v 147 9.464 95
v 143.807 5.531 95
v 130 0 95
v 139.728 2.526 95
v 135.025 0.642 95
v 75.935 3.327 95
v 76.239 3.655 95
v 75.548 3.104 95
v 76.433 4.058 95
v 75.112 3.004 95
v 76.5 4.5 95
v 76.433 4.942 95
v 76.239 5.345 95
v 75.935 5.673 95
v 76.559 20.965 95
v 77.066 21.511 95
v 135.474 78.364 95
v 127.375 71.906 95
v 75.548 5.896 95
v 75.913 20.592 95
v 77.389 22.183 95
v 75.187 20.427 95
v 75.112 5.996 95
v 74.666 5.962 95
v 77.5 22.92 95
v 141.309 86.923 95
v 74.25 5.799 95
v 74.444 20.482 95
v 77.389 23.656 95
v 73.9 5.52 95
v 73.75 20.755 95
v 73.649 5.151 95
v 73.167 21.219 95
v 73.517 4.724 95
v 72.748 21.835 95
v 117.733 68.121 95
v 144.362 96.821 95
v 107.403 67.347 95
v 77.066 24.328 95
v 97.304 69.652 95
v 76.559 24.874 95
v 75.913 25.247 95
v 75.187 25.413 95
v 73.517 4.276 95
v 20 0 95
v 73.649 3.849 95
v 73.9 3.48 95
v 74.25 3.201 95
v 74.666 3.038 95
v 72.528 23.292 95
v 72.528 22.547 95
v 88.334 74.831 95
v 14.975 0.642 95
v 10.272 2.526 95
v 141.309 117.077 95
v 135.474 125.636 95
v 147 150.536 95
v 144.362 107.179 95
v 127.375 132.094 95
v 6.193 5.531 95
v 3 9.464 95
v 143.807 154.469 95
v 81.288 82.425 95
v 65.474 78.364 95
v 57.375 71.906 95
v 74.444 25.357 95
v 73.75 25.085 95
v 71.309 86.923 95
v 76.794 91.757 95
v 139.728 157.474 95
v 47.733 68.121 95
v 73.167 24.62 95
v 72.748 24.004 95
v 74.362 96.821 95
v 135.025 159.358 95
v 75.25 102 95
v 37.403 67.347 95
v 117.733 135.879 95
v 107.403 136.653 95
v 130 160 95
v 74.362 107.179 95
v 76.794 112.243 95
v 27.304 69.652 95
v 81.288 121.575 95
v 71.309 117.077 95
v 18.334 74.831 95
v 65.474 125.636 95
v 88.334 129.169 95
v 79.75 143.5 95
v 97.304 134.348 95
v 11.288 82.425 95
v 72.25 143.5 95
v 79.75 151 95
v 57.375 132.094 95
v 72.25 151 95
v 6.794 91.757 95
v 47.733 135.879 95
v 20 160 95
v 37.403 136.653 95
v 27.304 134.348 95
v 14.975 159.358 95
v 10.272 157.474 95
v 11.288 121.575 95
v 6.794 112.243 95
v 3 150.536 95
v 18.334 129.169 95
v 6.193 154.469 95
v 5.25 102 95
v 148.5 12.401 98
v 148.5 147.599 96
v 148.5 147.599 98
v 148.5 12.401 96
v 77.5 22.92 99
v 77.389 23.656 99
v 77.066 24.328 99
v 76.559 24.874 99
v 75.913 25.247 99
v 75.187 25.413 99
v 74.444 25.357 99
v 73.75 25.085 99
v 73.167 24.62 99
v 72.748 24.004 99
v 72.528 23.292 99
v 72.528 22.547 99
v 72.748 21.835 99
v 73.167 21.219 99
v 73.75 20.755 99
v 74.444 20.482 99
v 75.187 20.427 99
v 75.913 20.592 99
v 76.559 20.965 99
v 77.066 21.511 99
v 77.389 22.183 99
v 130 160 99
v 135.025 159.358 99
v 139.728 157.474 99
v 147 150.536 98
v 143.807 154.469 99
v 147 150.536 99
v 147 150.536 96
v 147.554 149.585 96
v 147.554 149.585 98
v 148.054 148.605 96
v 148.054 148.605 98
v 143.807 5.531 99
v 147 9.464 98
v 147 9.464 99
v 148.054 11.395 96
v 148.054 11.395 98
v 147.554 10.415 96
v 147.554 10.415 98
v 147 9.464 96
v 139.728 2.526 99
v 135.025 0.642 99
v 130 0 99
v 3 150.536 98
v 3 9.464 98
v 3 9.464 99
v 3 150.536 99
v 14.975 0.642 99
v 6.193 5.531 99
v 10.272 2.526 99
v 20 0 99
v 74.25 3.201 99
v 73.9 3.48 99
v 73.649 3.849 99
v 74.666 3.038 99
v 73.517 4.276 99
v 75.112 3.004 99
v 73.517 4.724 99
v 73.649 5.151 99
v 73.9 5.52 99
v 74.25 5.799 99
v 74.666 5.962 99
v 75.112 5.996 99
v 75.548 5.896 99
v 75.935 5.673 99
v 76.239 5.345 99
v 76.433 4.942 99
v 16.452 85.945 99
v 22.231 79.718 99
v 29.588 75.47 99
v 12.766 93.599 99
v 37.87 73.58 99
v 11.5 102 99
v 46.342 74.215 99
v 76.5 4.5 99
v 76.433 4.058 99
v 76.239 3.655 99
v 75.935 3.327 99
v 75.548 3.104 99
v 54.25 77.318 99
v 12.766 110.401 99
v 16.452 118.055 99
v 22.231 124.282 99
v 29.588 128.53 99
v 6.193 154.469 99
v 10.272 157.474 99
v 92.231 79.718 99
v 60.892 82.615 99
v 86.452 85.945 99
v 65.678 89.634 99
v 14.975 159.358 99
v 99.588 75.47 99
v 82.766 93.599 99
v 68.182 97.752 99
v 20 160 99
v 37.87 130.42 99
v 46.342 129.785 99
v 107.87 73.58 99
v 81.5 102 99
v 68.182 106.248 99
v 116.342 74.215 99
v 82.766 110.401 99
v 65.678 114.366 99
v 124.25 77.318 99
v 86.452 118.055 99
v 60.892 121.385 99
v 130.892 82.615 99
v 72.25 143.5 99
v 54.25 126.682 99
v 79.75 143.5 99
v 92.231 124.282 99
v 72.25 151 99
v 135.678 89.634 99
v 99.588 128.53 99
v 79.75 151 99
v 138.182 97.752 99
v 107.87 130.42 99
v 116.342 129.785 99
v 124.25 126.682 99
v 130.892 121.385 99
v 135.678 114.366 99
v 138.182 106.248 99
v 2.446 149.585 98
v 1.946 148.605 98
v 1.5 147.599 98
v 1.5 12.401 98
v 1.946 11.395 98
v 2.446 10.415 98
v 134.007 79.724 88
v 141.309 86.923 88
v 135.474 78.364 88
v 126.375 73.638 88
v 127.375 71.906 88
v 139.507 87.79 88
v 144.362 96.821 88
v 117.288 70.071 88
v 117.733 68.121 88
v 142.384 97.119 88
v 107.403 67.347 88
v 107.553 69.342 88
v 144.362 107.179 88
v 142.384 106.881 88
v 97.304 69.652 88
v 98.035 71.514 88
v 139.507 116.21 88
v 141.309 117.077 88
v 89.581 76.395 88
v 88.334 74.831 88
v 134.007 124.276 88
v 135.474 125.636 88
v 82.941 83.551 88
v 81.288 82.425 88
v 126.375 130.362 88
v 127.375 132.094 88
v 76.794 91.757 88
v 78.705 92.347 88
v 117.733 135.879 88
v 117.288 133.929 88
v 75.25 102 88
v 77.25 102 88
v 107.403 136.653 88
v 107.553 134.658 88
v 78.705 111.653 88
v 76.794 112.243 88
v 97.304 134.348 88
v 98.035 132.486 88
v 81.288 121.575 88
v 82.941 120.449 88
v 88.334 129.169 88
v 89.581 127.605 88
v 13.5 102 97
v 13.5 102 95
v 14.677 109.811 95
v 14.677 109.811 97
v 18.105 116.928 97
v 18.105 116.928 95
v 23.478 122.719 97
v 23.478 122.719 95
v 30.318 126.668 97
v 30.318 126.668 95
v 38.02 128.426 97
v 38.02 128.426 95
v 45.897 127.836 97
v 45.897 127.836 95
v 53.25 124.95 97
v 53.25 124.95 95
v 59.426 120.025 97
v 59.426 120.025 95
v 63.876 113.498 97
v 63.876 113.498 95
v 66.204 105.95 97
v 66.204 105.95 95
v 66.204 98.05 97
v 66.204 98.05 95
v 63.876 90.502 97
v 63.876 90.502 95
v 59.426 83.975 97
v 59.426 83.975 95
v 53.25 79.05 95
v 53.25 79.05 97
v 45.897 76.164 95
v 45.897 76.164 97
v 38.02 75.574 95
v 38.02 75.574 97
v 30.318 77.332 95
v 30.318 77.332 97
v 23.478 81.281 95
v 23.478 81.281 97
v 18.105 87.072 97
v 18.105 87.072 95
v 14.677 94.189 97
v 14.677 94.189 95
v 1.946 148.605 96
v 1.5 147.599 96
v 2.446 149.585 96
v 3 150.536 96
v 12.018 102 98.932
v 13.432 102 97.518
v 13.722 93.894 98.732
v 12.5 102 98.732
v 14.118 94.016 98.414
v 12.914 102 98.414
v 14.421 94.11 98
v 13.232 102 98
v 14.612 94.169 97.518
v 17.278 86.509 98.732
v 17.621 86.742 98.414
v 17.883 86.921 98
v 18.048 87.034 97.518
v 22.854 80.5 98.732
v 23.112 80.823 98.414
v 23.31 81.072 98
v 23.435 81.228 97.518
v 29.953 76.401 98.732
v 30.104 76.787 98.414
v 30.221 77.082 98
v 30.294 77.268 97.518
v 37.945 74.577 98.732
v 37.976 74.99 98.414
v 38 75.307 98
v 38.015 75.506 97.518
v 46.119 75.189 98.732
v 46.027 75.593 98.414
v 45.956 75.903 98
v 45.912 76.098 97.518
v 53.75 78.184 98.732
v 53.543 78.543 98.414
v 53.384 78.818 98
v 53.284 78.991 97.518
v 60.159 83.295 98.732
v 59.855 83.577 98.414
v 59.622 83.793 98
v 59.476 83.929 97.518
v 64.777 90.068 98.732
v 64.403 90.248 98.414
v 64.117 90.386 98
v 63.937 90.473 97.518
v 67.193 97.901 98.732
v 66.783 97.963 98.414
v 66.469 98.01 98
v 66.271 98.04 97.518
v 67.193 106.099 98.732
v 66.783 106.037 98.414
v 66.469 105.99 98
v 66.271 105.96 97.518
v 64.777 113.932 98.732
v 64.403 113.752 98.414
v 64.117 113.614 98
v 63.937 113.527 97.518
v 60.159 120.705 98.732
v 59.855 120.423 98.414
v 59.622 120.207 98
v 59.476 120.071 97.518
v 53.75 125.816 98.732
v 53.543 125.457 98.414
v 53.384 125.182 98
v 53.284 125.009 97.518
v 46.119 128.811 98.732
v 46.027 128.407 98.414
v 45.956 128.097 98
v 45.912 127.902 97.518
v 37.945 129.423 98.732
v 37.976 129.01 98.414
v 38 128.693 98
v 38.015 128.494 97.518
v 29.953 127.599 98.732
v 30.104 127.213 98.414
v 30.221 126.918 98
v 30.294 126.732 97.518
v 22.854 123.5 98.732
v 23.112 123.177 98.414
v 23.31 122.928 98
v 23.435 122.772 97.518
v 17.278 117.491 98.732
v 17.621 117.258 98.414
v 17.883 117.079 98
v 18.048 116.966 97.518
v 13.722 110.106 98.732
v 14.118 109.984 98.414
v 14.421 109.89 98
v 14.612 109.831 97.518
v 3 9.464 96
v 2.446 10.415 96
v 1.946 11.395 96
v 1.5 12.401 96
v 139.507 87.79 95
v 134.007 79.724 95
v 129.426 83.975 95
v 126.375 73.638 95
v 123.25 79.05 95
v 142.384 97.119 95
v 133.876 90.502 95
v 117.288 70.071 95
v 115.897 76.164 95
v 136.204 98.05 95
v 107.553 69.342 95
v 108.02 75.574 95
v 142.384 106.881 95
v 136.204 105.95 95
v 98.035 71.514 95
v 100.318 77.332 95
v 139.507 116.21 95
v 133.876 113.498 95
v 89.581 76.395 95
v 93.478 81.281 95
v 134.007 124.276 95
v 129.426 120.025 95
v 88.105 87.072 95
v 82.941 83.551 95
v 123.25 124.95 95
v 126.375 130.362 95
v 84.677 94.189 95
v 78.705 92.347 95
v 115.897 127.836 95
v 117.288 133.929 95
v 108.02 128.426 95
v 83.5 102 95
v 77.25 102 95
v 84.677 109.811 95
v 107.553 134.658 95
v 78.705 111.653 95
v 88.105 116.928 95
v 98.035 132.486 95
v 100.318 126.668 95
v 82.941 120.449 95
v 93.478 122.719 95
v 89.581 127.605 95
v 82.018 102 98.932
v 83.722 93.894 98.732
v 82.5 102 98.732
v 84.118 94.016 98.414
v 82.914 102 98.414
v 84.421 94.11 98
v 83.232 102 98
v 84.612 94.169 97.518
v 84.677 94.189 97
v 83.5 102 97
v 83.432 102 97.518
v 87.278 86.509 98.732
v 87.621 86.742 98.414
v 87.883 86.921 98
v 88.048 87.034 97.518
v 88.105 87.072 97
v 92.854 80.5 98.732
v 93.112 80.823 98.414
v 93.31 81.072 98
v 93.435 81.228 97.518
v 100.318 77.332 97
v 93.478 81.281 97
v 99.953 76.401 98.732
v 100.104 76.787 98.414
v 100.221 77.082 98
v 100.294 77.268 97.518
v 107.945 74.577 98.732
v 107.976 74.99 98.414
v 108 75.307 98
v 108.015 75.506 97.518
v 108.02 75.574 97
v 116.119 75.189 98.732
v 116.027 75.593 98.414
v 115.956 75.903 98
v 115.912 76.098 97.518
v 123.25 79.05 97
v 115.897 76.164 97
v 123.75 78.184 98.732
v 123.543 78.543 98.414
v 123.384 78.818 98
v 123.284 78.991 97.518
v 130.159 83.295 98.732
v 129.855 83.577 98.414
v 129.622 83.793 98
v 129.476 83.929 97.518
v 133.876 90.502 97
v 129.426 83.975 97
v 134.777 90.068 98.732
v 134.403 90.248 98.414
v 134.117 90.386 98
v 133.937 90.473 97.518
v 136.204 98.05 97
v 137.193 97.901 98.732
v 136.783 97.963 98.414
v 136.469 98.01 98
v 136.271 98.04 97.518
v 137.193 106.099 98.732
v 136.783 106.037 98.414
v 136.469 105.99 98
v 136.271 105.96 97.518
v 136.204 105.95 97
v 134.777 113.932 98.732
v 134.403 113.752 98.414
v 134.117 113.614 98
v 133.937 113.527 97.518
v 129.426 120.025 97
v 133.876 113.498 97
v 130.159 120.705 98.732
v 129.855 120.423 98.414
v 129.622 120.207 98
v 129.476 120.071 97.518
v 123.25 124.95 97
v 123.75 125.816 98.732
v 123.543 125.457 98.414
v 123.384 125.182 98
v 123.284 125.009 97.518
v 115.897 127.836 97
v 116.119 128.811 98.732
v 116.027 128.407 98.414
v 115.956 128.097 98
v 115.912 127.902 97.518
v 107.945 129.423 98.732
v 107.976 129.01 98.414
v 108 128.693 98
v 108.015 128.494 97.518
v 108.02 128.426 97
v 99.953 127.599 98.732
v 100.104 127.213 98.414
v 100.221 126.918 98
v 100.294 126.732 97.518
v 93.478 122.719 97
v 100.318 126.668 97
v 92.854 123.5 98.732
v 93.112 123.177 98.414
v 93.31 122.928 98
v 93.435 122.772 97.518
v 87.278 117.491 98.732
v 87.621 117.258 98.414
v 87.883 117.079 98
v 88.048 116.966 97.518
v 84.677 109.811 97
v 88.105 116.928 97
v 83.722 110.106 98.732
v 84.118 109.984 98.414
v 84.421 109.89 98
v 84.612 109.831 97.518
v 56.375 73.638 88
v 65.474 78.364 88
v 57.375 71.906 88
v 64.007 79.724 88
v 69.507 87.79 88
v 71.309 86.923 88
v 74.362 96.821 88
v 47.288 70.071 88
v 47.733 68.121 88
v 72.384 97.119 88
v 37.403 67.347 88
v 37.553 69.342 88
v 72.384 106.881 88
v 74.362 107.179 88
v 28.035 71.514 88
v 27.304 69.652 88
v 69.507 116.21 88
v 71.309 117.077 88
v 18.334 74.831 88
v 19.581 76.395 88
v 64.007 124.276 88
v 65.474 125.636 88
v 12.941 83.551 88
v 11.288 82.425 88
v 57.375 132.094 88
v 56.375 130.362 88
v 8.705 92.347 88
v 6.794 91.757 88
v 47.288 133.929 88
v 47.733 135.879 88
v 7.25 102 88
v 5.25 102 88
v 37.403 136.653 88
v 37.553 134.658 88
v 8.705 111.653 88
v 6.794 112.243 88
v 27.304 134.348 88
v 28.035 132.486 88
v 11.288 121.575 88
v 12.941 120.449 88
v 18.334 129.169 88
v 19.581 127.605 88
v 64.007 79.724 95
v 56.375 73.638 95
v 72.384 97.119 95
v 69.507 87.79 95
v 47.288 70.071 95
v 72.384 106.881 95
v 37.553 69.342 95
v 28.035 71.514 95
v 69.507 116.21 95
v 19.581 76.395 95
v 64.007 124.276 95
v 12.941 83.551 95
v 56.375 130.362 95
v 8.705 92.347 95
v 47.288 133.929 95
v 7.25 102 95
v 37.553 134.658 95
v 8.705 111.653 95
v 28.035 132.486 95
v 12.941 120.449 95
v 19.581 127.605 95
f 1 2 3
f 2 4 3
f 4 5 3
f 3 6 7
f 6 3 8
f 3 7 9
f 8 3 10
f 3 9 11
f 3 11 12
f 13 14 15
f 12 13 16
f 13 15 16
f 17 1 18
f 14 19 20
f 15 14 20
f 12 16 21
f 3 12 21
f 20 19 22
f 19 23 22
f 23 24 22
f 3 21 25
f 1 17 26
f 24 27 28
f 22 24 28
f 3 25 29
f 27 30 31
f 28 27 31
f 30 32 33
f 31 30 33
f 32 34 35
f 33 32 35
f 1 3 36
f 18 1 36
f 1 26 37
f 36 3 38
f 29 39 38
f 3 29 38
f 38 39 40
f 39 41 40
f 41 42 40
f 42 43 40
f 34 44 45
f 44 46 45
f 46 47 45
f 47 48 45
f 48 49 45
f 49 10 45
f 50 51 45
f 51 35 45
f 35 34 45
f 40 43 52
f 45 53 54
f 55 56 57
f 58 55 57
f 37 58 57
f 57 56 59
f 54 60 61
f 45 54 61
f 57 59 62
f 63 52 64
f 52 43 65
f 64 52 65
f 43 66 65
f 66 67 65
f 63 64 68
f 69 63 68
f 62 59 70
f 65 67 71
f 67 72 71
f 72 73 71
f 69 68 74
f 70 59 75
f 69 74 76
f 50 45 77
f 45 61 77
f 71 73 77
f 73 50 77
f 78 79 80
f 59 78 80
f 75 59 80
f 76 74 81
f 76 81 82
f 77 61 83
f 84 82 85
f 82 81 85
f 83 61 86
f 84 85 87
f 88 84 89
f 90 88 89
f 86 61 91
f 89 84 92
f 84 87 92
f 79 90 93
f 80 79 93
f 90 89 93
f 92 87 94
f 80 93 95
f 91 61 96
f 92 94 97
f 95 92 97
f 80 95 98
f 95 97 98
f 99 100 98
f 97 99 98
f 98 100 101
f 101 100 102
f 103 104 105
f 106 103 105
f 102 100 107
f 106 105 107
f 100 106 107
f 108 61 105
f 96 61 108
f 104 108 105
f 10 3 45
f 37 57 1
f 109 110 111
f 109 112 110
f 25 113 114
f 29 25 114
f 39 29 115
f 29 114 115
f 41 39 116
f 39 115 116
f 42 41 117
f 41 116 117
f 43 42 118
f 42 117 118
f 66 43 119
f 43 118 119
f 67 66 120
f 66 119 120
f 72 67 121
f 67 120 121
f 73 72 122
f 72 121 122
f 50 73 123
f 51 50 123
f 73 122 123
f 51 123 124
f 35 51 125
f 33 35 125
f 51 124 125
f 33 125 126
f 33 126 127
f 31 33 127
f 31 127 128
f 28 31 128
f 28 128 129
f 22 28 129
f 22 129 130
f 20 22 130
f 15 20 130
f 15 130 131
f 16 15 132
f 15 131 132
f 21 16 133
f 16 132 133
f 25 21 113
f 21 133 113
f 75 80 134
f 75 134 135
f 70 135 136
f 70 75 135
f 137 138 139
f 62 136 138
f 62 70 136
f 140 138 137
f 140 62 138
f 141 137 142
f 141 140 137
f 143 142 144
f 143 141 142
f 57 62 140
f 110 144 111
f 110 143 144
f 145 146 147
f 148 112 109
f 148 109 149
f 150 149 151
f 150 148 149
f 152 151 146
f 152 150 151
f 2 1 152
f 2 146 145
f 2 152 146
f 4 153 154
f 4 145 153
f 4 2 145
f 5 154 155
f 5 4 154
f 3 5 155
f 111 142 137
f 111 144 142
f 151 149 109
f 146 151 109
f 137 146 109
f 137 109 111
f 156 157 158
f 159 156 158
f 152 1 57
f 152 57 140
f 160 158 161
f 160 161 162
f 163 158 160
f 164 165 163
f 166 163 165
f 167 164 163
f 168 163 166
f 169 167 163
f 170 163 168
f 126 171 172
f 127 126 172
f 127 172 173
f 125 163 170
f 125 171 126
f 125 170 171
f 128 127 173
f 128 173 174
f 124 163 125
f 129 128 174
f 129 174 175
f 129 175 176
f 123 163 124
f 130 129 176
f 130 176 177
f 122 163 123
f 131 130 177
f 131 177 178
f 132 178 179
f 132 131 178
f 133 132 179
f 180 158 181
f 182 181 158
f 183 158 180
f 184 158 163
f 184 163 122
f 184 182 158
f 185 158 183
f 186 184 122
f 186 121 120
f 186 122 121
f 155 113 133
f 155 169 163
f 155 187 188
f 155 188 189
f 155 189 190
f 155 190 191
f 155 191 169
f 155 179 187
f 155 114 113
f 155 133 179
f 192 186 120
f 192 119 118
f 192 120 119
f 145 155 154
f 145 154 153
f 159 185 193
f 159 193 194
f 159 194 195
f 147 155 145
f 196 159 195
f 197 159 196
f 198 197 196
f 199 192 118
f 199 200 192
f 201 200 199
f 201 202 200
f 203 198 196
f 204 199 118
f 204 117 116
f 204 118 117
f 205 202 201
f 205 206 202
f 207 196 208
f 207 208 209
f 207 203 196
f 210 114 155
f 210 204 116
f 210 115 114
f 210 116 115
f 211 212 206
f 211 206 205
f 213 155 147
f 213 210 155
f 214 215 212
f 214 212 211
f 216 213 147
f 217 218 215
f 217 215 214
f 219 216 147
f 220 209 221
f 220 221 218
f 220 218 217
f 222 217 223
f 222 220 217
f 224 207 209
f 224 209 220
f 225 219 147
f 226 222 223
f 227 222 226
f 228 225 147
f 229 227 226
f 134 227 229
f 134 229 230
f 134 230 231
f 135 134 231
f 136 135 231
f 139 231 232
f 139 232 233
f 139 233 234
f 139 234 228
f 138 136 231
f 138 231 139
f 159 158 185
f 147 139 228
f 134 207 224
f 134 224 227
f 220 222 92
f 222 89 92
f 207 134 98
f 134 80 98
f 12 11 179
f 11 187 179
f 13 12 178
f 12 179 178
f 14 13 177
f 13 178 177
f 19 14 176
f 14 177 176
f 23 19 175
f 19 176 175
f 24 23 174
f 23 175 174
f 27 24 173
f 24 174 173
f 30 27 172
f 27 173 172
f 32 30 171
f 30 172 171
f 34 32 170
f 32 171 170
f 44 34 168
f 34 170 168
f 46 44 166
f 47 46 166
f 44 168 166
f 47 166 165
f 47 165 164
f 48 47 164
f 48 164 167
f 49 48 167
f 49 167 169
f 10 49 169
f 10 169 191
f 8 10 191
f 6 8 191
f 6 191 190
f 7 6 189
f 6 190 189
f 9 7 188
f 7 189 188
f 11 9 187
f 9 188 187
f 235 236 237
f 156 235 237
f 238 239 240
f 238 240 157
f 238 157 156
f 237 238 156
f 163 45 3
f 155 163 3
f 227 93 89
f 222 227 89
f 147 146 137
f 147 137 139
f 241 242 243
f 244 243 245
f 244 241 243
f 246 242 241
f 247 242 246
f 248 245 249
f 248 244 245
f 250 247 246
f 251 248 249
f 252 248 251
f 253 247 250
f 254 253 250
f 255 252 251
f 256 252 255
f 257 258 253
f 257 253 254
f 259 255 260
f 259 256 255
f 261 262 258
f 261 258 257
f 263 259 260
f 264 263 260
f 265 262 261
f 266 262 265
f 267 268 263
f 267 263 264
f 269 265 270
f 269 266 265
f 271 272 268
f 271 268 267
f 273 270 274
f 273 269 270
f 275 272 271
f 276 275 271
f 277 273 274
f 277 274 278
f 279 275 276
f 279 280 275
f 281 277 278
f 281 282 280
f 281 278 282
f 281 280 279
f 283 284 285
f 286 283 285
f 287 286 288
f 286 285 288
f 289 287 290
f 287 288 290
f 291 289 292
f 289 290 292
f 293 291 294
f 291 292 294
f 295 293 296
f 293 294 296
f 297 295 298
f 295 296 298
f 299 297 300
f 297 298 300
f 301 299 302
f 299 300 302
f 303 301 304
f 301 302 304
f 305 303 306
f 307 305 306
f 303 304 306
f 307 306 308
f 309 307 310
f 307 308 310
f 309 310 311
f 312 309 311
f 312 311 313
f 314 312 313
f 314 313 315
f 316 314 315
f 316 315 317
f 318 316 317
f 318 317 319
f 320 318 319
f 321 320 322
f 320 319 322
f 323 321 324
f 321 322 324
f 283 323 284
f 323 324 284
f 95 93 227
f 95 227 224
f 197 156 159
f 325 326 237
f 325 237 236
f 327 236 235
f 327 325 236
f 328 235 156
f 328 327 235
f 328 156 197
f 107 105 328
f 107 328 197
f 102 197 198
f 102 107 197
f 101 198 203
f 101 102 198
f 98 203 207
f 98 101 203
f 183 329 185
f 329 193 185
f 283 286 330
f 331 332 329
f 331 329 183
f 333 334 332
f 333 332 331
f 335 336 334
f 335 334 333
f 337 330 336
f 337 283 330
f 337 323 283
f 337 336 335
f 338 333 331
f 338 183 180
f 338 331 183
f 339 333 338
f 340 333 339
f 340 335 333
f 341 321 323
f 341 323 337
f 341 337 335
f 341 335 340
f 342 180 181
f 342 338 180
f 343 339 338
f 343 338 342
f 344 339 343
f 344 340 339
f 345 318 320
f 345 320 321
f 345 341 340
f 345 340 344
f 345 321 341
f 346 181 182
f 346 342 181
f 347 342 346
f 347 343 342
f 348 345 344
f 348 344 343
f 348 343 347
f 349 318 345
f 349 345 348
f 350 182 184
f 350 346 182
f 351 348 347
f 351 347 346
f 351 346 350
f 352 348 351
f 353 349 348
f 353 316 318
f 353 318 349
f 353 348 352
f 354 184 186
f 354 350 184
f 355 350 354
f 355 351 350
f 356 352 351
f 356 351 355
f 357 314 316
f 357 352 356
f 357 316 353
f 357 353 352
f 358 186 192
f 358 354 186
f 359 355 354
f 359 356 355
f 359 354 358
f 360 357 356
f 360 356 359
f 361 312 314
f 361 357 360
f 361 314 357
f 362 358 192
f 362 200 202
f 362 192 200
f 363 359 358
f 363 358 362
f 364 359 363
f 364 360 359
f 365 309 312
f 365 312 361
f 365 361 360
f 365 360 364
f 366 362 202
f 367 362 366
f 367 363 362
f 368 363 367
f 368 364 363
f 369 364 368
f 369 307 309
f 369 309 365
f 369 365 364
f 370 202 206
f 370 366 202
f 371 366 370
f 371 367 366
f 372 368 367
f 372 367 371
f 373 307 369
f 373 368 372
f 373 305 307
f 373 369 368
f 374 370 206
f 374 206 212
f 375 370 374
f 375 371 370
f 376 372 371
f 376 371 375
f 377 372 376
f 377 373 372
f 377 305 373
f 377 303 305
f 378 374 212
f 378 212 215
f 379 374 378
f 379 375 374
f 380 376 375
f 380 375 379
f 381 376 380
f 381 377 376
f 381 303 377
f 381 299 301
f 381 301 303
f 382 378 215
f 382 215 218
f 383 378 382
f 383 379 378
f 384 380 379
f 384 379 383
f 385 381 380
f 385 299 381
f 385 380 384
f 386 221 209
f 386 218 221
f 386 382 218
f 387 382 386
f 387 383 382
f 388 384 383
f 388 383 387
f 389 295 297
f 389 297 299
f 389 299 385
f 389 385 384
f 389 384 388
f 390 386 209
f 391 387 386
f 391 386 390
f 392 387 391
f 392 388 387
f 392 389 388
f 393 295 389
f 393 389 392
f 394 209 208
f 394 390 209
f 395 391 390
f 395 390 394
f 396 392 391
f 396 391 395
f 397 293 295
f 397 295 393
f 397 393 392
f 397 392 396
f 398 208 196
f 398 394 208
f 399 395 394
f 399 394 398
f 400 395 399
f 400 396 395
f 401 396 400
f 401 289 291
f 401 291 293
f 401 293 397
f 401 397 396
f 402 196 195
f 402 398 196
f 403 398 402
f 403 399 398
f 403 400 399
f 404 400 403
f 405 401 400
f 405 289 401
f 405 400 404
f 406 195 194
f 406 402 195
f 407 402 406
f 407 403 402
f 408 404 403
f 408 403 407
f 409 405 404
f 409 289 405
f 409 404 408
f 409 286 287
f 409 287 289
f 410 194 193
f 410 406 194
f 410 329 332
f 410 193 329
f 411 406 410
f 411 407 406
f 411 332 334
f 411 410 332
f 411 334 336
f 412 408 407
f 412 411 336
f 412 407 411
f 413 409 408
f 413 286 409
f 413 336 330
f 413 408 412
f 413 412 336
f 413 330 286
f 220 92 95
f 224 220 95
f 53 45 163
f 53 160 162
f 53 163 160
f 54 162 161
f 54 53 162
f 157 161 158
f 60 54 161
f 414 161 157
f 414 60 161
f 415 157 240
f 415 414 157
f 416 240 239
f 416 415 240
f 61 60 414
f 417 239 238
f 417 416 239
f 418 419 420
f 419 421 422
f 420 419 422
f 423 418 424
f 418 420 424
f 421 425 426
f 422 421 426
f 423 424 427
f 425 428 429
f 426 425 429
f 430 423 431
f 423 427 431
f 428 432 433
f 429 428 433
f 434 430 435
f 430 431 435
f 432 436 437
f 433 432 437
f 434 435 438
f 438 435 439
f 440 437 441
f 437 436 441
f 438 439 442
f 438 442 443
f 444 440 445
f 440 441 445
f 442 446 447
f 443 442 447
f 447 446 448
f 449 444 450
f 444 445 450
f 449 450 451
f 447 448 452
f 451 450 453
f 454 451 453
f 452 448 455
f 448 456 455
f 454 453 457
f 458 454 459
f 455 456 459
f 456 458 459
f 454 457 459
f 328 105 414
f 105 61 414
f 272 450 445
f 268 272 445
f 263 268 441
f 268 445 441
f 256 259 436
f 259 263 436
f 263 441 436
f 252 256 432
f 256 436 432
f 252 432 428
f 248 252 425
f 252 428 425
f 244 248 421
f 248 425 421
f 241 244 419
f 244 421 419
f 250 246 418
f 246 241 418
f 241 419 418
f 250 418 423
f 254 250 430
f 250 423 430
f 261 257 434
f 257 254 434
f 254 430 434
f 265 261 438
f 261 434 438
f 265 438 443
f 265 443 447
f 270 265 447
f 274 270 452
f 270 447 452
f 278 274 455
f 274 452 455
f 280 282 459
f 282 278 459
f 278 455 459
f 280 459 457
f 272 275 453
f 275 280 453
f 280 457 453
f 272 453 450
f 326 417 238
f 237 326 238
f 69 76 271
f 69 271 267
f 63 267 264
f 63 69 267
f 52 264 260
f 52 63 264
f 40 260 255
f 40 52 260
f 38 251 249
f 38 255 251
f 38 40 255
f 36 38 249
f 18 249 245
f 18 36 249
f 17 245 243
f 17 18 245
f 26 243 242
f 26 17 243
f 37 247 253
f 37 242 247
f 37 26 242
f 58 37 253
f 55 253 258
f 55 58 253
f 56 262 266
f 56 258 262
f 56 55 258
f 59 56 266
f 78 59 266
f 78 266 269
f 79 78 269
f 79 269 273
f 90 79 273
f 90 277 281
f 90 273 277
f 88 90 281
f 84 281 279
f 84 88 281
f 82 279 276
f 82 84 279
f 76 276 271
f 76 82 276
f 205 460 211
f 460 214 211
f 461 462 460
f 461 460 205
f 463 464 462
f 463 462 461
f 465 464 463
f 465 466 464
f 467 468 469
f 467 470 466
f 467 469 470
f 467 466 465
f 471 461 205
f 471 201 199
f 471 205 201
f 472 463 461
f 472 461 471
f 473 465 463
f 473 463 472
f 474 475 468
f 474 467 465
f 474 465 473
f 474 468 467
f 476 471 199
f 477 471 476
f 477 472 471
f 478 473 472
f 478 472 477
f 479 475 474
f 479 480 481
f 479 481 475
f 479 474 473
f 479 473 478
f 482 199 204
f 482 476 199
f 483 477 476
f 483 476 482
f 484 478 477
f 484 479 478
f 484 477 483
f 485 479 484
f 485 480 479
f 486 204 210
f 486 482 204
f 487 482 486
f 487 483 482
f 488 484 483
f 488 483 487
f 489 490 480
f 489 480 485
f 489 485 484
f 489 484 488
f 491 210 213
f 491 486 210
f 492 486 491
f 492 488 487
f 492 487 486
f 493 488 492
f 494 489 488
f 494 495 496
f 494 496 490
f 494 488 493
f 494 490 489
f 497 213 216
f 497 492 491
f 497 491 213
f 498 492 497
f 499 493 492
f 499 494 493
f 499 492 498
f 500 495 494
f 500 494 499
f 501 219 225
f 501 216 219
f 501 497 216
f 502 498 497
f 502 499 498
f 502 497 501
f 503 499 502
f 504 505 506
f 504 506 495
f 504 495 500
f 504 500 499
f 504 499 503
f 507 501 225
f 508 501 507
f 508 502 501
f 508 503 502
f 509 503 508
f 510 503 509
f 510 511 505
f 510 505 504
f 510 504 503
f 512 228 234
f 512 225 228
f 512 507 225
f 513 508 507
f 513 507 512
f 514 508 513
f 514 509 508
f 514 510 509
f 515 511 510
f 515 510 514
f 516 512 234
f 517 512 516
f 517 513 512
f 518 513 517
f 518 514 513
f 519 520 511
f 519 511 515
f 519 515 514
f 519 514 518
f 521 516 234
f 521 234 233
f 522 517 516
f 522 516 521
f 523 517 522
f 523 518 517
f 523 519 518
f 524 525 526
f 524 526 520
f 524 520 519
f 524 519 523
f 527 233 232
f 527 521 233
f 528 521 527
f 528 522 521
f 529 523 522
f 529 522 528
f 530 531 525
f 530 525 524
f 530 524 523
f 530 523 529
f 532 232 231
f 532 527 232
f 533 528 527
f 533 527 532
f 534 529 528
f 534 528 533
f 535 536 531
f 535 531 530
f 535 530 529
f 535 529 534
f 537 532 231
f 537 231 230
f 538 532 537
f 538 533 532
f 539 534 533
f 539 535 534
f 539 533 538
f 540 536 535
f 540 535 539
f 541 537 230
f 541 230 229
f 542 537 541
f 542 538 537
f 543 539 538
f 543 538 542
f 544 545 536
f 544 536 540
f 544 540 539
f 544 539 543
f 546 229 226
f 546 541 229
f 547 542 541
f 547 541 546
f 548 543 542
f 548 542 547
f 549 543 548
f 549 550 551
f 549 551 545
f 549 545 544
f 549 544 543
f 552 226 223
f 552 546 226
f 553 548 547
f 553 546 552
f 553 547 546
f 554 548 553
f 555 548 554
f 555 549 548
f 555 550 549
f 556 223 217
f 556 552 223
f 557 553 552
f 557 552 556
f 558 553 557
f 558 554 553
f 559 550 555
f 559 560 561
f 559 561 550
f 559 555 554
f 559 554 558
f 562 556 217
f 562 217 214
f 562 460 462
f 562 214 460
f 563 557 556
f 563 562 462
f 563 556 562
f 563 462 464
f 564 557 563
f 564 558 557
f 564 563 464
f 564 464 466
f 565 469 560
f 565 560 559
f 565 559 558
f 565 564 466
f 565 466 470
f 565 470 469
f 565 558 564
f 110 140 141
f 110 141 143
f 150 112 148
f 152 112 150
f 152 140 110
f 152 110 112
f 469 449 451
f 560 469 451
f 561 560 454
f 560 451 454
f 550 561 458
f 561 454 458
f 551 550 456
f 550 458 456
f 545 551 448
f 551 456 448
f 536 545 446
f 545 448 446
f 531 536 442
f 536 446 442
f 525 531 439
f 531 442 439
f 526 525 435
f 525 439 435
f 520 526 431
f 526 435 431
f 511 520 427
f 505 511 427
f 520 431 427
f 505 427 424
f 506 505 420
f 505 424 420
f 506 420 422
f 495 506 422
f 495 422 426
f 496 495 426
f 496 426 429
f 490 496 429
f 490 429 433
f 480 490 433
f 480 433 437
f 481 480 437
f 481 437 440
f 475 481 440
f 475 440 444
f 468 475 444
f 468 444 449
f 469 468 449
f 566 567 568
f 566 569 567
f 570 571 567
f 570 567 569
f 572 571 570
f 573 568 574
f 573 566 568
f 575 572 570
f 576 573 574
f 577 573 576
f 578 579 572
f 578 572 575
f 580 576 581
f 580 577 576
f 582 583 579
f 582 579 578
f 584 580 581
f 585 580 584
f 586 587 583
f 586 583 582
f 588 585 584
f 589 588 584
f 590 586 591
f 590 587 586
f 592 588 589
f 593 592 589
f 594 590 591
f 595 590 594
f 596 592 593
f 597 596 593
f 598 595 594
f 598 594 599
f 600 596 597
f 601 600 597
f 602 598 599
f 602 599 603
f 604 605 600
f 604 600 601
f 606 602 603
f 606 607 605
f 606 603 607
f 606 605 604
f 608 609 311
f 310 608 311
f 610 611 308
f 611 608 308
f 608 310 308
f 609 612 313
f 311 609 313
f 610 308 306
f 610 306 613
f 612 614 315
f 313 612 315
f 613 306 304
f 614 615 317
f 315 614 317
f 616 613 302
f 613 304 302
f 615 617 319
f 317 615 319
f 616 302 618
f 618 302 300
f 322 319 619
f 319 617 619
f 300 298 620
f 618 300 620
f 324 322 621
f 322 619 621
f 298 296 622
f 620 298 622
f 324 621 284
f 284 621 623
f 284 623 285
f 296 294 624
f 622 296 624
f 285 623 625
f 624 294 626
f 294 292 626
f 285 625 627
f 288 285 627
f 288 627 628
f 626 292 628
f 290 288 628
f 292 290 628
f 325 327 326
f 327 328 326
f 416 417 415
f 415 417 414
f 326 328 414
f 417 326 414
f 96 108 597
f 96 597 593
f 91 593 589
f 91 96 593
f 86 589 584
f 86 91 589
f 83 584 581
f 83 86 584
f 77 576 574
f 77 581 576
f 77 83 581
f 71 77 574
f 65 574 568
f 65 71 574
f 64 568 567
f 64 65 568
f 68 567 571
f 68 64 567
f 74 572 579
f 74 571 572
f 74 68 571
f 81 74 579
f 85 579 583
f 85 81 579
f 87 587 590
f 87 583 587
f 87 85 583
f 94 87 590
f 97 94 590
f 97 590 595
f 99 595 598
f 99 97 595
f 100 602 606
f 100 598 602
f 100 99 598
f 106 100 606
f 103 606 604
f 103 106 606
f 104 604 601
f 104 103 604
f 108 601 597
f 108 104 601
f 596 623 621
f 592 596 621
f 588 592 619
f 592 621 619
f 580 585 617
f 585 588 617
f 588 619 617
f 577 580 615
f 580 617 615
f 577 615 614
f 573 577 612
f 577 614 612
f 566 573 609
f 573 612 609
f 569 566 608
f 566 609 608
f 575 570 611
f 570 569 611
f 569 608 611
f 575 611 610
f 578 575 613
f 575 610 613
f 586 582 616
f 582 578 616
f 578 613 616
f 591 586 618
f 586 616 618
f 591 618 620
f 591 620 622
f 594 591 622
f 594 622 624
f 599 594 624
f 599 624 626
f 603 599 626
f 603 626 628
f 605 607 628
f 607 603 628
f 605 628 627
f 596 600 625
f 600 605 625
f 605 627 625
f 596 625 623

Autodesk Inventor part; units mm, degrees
sketch "Sketch1" plane through (0, 0, 0) normal (0, 0, 1) x (1, 0, 0)
  line L0 (20, 0) -> (130, 0)
  line L1 (150, 20) -> (150, 140)
  line L2 (130, 160) -> (20, 160)
  line L3 (0, 140) -> (0, 20)
  arc A0 (20, 160) -> (0, 140) centre (20, 140) ccw
  arc A1 (150, 140) -> (130, 160) centre (130, 140) ccw
  arc A2 (130, 0) -> (150, 20) centre (130, 20) ccw
  arc A3 (0, 20) -> (20, 0) centre (20, 20) ccw
  point P0 (0, 0)
  point P1 (150, 160)
  point P2 (150, 0)
  point P3 (0, 160)
  dimension "d443" = 160
  dimension "d444" = 150
extrude "Extrusion1" add sketch "Sketch1" along normal blind 95
sketch "Sketch5" plane through (0, 0, 95) normal (0, 0, 1) x (1, 0, 0)
  line L0 (130, 157) -> (20, 157)
  arc A0 (20, 157) -> (3, 140) centre (20, 140) ccw
  line L1 (3, 140) -> (3, 20)
  arc A1 (3, 20) -> (20, 3) centre (20, 20) ccw
  line L2 (20, 3) -> (130, 3)
  arc A2 (130, 3) -> (147, 20) centre (130, 20) ccw
  line L3 (147, 20) -> (147, 140)
  arc A3 (147, 140) -> (130, 157) centre (130, 140) ccw
  point P0 (0, 0)
  point P1 (0, 165)
  point P2 (150, 165)
  point P3 (0, 160)
  point P4 (150, 160)
  point P5 (150, 0)
  dimension "d456" = 160
  dimension "d457" = 150
  dimension "d458" = 160
  dimension "d459" = 150
extrude "Extrusion2" cut sketch "Sketch5" against normal blind 92
sketch "Sketch7" plane through (0, 20, 0) normal (-1, 0, 0) x (0, 0, 1)
  circle A0 centre (47.5, 110) radius 7.8
  point P0 (95, 120)
  dimension "d455" = 15.6
extrude "Extrusion4" cut sketch "Sketch7" against normal blind 98
sketch "Boceto12" plane through (20, 0, 0) normal (0, -1, 0) x (1, 0, 0)
  circle A0 centre (81.375, 48) radius 12
  circle A1 centre (28.625, 48) radius 12
extrude "Extrusión6" cut sketch "Boceto12" against normal blind 5
sketch "Boceto36" plane through (20, 160, 0) normal (0, 1, 0) x (1, 0, 0)
  circle A0 centre (55, -47.7801) radius 15
  dimension "d388" = 30
extrude "Extrusión17" cut sketch "Boceto36" against normal blind 6
ref_plane "Plano de trabajo1" through (0, 0, -50) normal (0, 0, -1) x (-1, 0, 0)
ref_plane "Plano de trabajo4" through (203.75, 20, 0) normal (-1, 0, 0) x (0, 0, 1)
ref_plane "Plano de trabajo5" through (200, 20, 0) normal (1, 0, 0) x (0, 0, -1)
ref_plane "Plano de trabajo6" through (20, 210, 0) normal (0, 1, 0) x (1, 0, 0)
sketch "Boceto57" plane through (150, 20, 0) normal (1, 0, 0) x (0, 0, -1)
  circle A0 centre (-47.5, 110) radius 7.8
  dimension "d453" = 15.6
extrude "Extrusión26" cut sketch "Boceto57" against normal blind 10
sketch "Boceto61" plane through (0, 0, 0) normal (0, 0, -1) x (-1, 0, 0)
  circle A0 centre (-75, 128.3417) radius 7.5
  circle A1 centre (-74.9977, 103.4764) radius 7.5
  circle A2 centre (-74.9673, 78.5161) radius 7.5
  dimension "d399" = 15
extrude "Extrusión28" add sketch "Boceto61" along normal blind 4
sketch "Boceto64" plane through (20, 160, 0) normal (0, 1, 0) x (1, 0, 0)
  circle A0 centre (12, -12) radius 1.5
  circle A1 centre (98, -12) radius 1.5
  circle A2 centre (12, -83) radius 1.5
  circle A3 centre (98, -83) radius 1.5
  dimension "d417" = 3
  dimension "d418" = 3
  dimension "d468" = 3
  dimension "d469" = 3
extrude "Extrusión30" cut sketch "Boceto64" against normal blind 20
sketch "Boceto65" plane through (20, 0, 0) normal (0, -1, 0) x (1, 0, 0)
  circle A0 centre (14.995, 99.7655) radius 2.5
  circle A1 centre (94.995, 99.7655) radius 2.5
  circle A2 centre (14.995, 19.7655) radius 2.5
  circle A3 centre (94.995, 19.7655) radius 2.5
extrude "Extrusión31" cut sketch "Boceto65" against normal blind 10
sketch "Boceto66" plane through (20, 0, 0) normal (0, -1, 0) x (1, 0, 0)
  circle A0 centre (28.625, 48) radius 12 projected
  circle A1 centre (28.625, 48) radius 21
  circle A2 centre (81.375, 48) radius 12 projected
  circle A3 centre (81.375, 48) radius 21
  point P0 (-20, 0)
  dimension "d474" = 42
  dimension "d475" = 42
extrude "Extrusión32" cut sketch "Boceto66" against normal blind 10
sketch "Boceto67" plane through (20, 3, 95) normal (0, 1, 0) x (1, 0, 0)
  circle A0 centre (28.625, 47) radius 21 projected
  circle A1 centre (28.625, 47) radius 21
  circle A2 centre (28.625, 47) radius 25
  point P0 (-20, 95)
  dimension "d478" = 42
  dimension "d479" = 50
extrude "Extrusión33" add sketch "Boceto67" along normal blind 6
sketch "Boceto68" plane through (20, 3, 95) normal (0, 1, 0) x (1, 0, 0)
  circle A0 centre (81.375, 47) radius 21 projected
  circle A1 centre (81.375, 47) radius 25
  point P0 (-20, 95)
  dimension "d482" = 50
extrude "Extrusión34" add sketch "Boceto68" along normal blind 6
fillet "Empalme1" radius 2 3 edges at (82.5, 128.3417, -4) (82.4977, 103.4764, -4) (82.4673, 78.5161, -4)
sketch "Boceto69" plane through (20, 160, 0) normal (0, 1, 0) x (1, 0, 0)
  line L0 (12, -22.2801) -> (82, -22.2801) projected
  line L1 (82, -22.2801) -> (82, -62.2801) projected
  line L2 (12, -62.2801) -> (12, -22.2801) projected
  line L3 (82, -62.2801) -> (12, -62.2801) projected
  point P0 (-20, 0)
extrude "Extrusión35" cut sketch "Boceto69" against normal blind 10
sketch "Boceto70" plane through (20, 3, 95) normal (0, 1, 0) x (1, 0, 0)
  point P0 (-20, 95)
sketch "Boceto71" plane through (20, 3, 95) normal (0, 1, 0) x (1, 0, 0)
  circle A0 centre (81.375, 47) radius 25 projected
  circle A1 centre (28.625, 47) radius 25 projected
  circle A2 centre (14.995, 75.2345) radius 2.5 projected
  circle A3 centre (94.995, 75.2345) radius 2.5 projected
  line L0 (110, 0) -> (0, 0) projected
  line L1 (110, 0) -> (110, 92) projected
  line L2 (110, 92) -> (0, 92) projected
  line L3 (0, 0) -> (0, 92) projected
  point P0 (-20, 95)
extrude "Extrusión36" add sketch "Boceto71" along normal up to surface (6 mm away)
sketch "Boceto72" plane through (147, 20, 95) normal (-1, 0, 0) x (0, 0, 1)
  circle A0 centre (-47.5, 110) radius 7.8 projected
  line L0 (-47.5, 110) -> (-47.5, 126.557)
  line L1 (-47.5, 126.557) -> (-53.5, 126.557)
  line L2 (-53.5, 126.557) -> (-41.5, 126.557)
  line L3 (-53.5, 126.557) -> (-41.5, 126.557)
  line L4 (-41.5, 126.557) -> (-41.5, 131.557)
  line L5 (-41.5, 131.557) -> (-53.5, 131.557)
  line L6 (-53.5, 131.557) -> (-53.5, 126.557)
  line L7 (-47.5, 126.557) -> (-47.5, 115.307)
  line L8 (-47.5, 115.307) -> (-36.0059, 115.307)
  line L9 (-47.5, 120.614) -> (-47.5, 104.057)
  line L10 (-47.5, 104.057) -> (-53.5, 104.057)
  line L11 (-53.5, 104.057) -> (-41.5, 104.057)
  line L12 (-53.5, 104.057) -> (-41.5, 104.057)
  line L13 (-41.5, 104.057) -> (-41.5, 99.057)
  line L14 (-41.5, 99.057) -> (-53.5, 99.057)
  line L15 (-53.5, 99.057) -> (-53.5, 104.057)
  line L16 (-47.5, 104.057) -> (-47.5, 115.307)
  point P0 (-95, -20)
  dimension "d490" = 16.557
  dimension "d491" = 6
  dimension "d492" = 12
  dimension "d493" = 12
  dimension "d494" = 5
  dimension "d497" = 11.25
extrude "Extrusión37" add sketch "Boceto72" along normal blind 9 contours L1 L6 L5 L4 L2
extrude "Extrusión38" add sketch "Boceto72" along normal up to surface (9 mm away) contours L11 L13 L14 L15 L10 A0 | A0 L10 L11
sketch "Boceto73" plane through (0, 0, 95) normal (0, 0, 1) x (1, 0, 0)
  arc A0 (150, 140) -> (130, 160) centre (130, 140) ccw projected
  line L0 (130, 160) -> (150, 160)
  line L1 (150, 160) -> (150, 140)
  point P0 (0, 0)
extrude "Extrusión39" cut sketch "Boceto73" against normal blind 1200
ref_plane "Plano de trabajo20" through (75, 0, 0) normal (1, 0, 0) x (0, 1, 0)
mirror "Simetría1" about plane through (75, 0, 0) normal (1, 0, 0) of "Extrusión37", "Extrusión38"
mirror "Simetría2" about plane through (75, 0, 0) normal (1, 0, 0) of "Extrusión39"
sketch "Boceto74" plane through (138, 20, 95) normal (-1, 0, 0) x (0, 0, 1)
  arc A0 (-48, 129.616) -> (-47, 129.616) centre (-47.5, 128.75) ccw projected
  circle A1 centre (-47.5, 128.75) radius 1
  point P0 (-95, -20)
extrude "Extrusión40" cut sketch "Boceto74" along normal blind 133 and the other way blind 8
sketch "Boceto75" plane through (138, 119.057, 41.5) normal (-1, 0, 0) x (0, 0, 1)
  arc A0 (6.5, 1.827) -> (5.5, 1.827) centre (6, 2.693) ccw projected
  circle A1 centre (6, 2.693) radius 1
  point P0 (-41.5, -119.057)
  dimension "d507" = 2
extrude "Extrusión41" cut sketch "Boceto75" along normal blind 134 and the other way blind 9
sketch "Boceto76" plane through (0, 0, 95) normal (0, 0, 1) x (1, 0, 0)
  line L0 (150, 20) -> (150, 140) projected
  line L1 (147, 140) -> (147, 20) projected
  line L2 (3, 20) -> (3, 140) projected
  line L3 (0, 140) -> (0, 20) projected
  line L4 (0, 140) -> (3, 140)
  line L5 (0, 20) -> (3, 20)
  line L6 (147, 20) -> (150, 20)
  line L7 (147, 140) -> (147, 20) projected
  line L8 (147, 140) -> (150, 140)
  point P0 (0, 0)
extrude "Extrusión42" add sketch "Boceto76" along normal blind 4
sketch "Boceto77" plane through (147, 20, 3) normal (-1, 0, 0) x (0, 0, 1)
  line L0 (96, 0) -> (96, 120) projected
  line L1 (96, 120) -> (95, 120)
  line L2 (92, 120) -> (96, 120) projected
  line L3 (95, 120) -> (93, 120)
  line L4 (93, 120) -> (93, 0)
  line L5 (93, 0) -> (95, 0)
  line L6 (95, 0) -> (95, 120)
  point P0 (-3, -20)
  dimension "d514" = 1
  dimension "d515" = 2
extrude "Extrusión43" cut sketch "Boceto77" against normal blind 1.5
extrude "Extrusión44" cut sketch "Boceto77" along normal blind 1.5 from surface at 144
sketch "Boceto78" plane through (0, 0, 95) normal (0, 0, 1) x (1, 0, 0)
  line L0 (20, 9) -> (130, 9) projected
  line L1 (75, 9) -> (75, 0)
  circle A0 centre (75, 4.5) radius 1.5
  point P0 (0, 0)
  dimension "d520" = 3
extrude "Extrusión45" cut sketch "Boceto78" against normal blind 10
sketch "Boceto79" plane through (0, 0, 95) normal (0, 0, 1) x (1, 0, 0)
  line L0 (130, 160) -> (20, 160) projected
  arc A0 (20, 160) -> (0, 140) centre (20, 140) ccw projected
  line L1 (0, 140) -> (0, 20) projected
  arc A1 (0, 20) -> (20, 0) centre (20, 20) ccw projected
  line L2 (20, 0) -> (130, 0) projected
  arc A2 (130, 0) -> (150, 20) centre (130, 20) ccw projected
  line L3 (150, 20) -> (150, 140) projected
  arc A3 (150, 140) -> (130, 160) centre (130, 140) ccw projected
  point P0 (0, 0)
extrude "Extrusión46" add sketch "Boceto79" along normal blind 4
sketch "Boceto80" plane through (75, 0, 0) normal (1, 0, 0) x (0, 1, 0)
  line L0 (140, 99) -> (20, 99) projected
  line L1 (20, 95) -> (20, 3) projected
  line L2 (20, 99) -> (20, 95)
  line L3 (-19.9561, 95) -> (216.2183, 95)
  line L4 (216.2183, 95) -> (216.2183, -18.3068)
  line L5 (216.2183, -18.3068) -> (-19.9561, -18.3068)
  line L6 (-19.9561, -18.3068) -> (-19.9561, 95)
  point P0 (0, 0)
  dimension "d525" = 4
extrude "Extrusión47" cut sketch "Boceto80" along normal mid plane 300
sketch "Boceto81" plane through (150, 20, 99) normal (1, 0, 0) x (0, 0, -1)
  line L0 (4, 140) -> (4, 120) projected
  line L1 (4, 140) -> (4, 137)
  line L2 (4, 137) -> (3, 137)
  line L3 (3, 137) -> (3, 138.5)
  line L4 (3, 138.5) -> (1, 138.5)
  line L5 (1, 138.5) -> (1, 137)
  line L6 (1, 137) -> (0, 137)
  line L7 (0, 140) -> (0, 120) projected
  line L8 (0, 137) -> (0, 140)
  line L9 (0, 140) -> (4, 140)
  line L10 (4, 0) -> (4, 120) projected
  line L11 (4, 60) -> (-16.1997, 60)
  line L12 (4, -20) -> (4, 0)
  line L13 (4, -20) -> (4, -17)
  line L14 (4, -17) -> (3, -17)
  line L15 (3, -17) -> (3, -18.5)
  line L16 (3, -18.5) -> (1, -18.5)
  line L17 (1, -18.5) -> (1, -17)
  line L18 (1, -17) -> (0, -17)
  line L19 (0, -20) -> (0, 0)
  line L20 (0, -17) -> (0, -20)
  line L21 (0, -20) -> (4, -20)
  point P0 (99, -20)
  dimension "d528" = 3
  dimension "d529" = 1
  dimension "d530" = 1.5
  dimension "d531" = 2
  dimension "d532" = 1.5
  dimension "d533" = 1
sketch "Boceto83" plane through (20, 0, 99) normal (0, -1, 0) x (1, 0, 0)
  line L0 (130, -4) -> (110, -4) projected
  line L1 (130, -4) -> (127, -4)
  line L2 (127, -4) -> (127, -3)
  line L3 (127, -3) -> (128.5, -3)
  line L4 (128.5, -3) -> (128.5, -1)
  line L5 (128.5, -1) -> (127, -1)
  line L6 (127, -1) -> (127, 0)
  line L7 (130, 0) -> (110, 0) projected
  line L8 (127, 0) -> (130, 0)
  line L9 (130, -4) -> (130, 0) projected
  line L10 (130, 0) -> (130, -4)
  line L11 (0, 0) -> (110, 0) projected
  line L12 (55, 0) -> (55, -2)
  line L13 (-20, -4) -> (0, -4)
  line L14 (-20, -4) -> (-17, -4)
  line L15 (-17, -4) -> (-17, -3)
  line L16 (-17, -3) -> (-18.5, -3)
  line L17 (-18.5, -3) -> (-18.5, -1)
  line L18 (-18.5, -1) -> (-17, -1)
  line L19 (-17, -1) -> (-17, 0)
  line L20 (-20, 0) -> (0, 0)
  line L21 (-17, 0) -> (-20, 0)
  line L22 (-20, -4) -> (-20, 0)
  line L23 (-20, 0) -> (-20, -4)
  point P0 (-20, -99)
  dimension "d540" = 3
  dimension "d541" = 1
  dimension "d542" = 1.5
  dimension "d543" = 2
  dimension "d544" = 1.5
extrude "Extrusión50" cut sketch "Boceto83" against normal blind 200
sketch "Boceto84" plane through (0, 0, 99) normal (0, 0, 1) x (1, 0, 0)
  line L0 (20, 0) -> (130, 0) projected
  line L1 (75, 0) -> (75, 4.5)
  circle A0 centre (75, 4.5) radius 1.5
  point P0 (0, 0)
  dimension "d547" = 4.5
  dimension "d548" = 3
extrude "Extrusión51" cut sketch "Boceto84" against normal blind 200
sketch "Boceto85" plane through (0, 0, 95) normal (0, 0, -1) x (-1, 0, 0)
  circle A0 centre (-110, 102) radius 32.75
  circle A1 centre (-40, 102) radius 32.75
  circle A2 centre (-110, 102) radius 34.75
  circle A3 centre (-40, 102) radius 34.75
  point P0 (0, 0)
  dimension "d555" = 65.5
  dimension "d558" = 65.5
  dimension "d559" = 2
  dimension "d560" = 2
extrude "Extrusión52" add sketch "Boceto85" along normal blind 7
sketch "Boceto86" plane through (110, 102, 95) normal (0, 0, -1) x (-1, 0, 0)
  circle A0 centre (0, 0) radius 26.5
  circle A1 centre (70, 0) radius 26.5
  point P0 (110, -102)
  dimension "d563" = 53
  dimension "d564" = 53
extrude "Extrusión53" cut sketch "Boceto86" against normal blind 8
fillet "Empalme2" radius 2 2 edges at (66.5, 102, 99) (136.5, 102, 99)
sketch "Boceto87" plane through (0, 0, 95) normal (0, 0, -1) x (-1, 0, 0)
  line L0 (-79.75, 151) -> (-75, 151)
  line L1 (-79.75, 151) -> (-79.75, 143.5)
  line L2 (-79.75, 143.5) -> (-72.25, 143.5)
  line L3 (-72.25, 143.5) -> (-72.25, 151)
  line L4 (-75, 151) -> (-72.25, 151)
  dimension "d587" = 4.75
  dimension "d593" = 7.5
  dimension "d594" = 7.5
extrude "Extrusión54" cut sketch "Boceto87" against normal blind 8
sketch "Boceto88" plane through (0, 0, 99) normal (0, 0, 1) x (1, 0, 0)
  circle A0 centre (75, 22.9196) radius 2.5
  point P0 (0, 0)
  dimension "d584" = 5
extrude "Extrusión55" cut sketch "Boceto88" against normal blind 10
equation "\"BendRadius\" = Thickness"
equation "\"BendReliefWidth\" = Thickness"
equation "\"BendReliefDepth\" = 0.5 * Thickness"
equation "\"CornerReliefSize\" = 4 * Thickness"
equation "\"MinimumRemnant\" = 2 * Thickness"
equation "\"TransitionRadius\" = BendRadius"
equation "\"JacobiRadiusSize\" = BendRadius"
equation "\"GapSize\" = Thickness"
equation "\"Thickness\" = 0.5"
properties part number "tapacuerpo"
